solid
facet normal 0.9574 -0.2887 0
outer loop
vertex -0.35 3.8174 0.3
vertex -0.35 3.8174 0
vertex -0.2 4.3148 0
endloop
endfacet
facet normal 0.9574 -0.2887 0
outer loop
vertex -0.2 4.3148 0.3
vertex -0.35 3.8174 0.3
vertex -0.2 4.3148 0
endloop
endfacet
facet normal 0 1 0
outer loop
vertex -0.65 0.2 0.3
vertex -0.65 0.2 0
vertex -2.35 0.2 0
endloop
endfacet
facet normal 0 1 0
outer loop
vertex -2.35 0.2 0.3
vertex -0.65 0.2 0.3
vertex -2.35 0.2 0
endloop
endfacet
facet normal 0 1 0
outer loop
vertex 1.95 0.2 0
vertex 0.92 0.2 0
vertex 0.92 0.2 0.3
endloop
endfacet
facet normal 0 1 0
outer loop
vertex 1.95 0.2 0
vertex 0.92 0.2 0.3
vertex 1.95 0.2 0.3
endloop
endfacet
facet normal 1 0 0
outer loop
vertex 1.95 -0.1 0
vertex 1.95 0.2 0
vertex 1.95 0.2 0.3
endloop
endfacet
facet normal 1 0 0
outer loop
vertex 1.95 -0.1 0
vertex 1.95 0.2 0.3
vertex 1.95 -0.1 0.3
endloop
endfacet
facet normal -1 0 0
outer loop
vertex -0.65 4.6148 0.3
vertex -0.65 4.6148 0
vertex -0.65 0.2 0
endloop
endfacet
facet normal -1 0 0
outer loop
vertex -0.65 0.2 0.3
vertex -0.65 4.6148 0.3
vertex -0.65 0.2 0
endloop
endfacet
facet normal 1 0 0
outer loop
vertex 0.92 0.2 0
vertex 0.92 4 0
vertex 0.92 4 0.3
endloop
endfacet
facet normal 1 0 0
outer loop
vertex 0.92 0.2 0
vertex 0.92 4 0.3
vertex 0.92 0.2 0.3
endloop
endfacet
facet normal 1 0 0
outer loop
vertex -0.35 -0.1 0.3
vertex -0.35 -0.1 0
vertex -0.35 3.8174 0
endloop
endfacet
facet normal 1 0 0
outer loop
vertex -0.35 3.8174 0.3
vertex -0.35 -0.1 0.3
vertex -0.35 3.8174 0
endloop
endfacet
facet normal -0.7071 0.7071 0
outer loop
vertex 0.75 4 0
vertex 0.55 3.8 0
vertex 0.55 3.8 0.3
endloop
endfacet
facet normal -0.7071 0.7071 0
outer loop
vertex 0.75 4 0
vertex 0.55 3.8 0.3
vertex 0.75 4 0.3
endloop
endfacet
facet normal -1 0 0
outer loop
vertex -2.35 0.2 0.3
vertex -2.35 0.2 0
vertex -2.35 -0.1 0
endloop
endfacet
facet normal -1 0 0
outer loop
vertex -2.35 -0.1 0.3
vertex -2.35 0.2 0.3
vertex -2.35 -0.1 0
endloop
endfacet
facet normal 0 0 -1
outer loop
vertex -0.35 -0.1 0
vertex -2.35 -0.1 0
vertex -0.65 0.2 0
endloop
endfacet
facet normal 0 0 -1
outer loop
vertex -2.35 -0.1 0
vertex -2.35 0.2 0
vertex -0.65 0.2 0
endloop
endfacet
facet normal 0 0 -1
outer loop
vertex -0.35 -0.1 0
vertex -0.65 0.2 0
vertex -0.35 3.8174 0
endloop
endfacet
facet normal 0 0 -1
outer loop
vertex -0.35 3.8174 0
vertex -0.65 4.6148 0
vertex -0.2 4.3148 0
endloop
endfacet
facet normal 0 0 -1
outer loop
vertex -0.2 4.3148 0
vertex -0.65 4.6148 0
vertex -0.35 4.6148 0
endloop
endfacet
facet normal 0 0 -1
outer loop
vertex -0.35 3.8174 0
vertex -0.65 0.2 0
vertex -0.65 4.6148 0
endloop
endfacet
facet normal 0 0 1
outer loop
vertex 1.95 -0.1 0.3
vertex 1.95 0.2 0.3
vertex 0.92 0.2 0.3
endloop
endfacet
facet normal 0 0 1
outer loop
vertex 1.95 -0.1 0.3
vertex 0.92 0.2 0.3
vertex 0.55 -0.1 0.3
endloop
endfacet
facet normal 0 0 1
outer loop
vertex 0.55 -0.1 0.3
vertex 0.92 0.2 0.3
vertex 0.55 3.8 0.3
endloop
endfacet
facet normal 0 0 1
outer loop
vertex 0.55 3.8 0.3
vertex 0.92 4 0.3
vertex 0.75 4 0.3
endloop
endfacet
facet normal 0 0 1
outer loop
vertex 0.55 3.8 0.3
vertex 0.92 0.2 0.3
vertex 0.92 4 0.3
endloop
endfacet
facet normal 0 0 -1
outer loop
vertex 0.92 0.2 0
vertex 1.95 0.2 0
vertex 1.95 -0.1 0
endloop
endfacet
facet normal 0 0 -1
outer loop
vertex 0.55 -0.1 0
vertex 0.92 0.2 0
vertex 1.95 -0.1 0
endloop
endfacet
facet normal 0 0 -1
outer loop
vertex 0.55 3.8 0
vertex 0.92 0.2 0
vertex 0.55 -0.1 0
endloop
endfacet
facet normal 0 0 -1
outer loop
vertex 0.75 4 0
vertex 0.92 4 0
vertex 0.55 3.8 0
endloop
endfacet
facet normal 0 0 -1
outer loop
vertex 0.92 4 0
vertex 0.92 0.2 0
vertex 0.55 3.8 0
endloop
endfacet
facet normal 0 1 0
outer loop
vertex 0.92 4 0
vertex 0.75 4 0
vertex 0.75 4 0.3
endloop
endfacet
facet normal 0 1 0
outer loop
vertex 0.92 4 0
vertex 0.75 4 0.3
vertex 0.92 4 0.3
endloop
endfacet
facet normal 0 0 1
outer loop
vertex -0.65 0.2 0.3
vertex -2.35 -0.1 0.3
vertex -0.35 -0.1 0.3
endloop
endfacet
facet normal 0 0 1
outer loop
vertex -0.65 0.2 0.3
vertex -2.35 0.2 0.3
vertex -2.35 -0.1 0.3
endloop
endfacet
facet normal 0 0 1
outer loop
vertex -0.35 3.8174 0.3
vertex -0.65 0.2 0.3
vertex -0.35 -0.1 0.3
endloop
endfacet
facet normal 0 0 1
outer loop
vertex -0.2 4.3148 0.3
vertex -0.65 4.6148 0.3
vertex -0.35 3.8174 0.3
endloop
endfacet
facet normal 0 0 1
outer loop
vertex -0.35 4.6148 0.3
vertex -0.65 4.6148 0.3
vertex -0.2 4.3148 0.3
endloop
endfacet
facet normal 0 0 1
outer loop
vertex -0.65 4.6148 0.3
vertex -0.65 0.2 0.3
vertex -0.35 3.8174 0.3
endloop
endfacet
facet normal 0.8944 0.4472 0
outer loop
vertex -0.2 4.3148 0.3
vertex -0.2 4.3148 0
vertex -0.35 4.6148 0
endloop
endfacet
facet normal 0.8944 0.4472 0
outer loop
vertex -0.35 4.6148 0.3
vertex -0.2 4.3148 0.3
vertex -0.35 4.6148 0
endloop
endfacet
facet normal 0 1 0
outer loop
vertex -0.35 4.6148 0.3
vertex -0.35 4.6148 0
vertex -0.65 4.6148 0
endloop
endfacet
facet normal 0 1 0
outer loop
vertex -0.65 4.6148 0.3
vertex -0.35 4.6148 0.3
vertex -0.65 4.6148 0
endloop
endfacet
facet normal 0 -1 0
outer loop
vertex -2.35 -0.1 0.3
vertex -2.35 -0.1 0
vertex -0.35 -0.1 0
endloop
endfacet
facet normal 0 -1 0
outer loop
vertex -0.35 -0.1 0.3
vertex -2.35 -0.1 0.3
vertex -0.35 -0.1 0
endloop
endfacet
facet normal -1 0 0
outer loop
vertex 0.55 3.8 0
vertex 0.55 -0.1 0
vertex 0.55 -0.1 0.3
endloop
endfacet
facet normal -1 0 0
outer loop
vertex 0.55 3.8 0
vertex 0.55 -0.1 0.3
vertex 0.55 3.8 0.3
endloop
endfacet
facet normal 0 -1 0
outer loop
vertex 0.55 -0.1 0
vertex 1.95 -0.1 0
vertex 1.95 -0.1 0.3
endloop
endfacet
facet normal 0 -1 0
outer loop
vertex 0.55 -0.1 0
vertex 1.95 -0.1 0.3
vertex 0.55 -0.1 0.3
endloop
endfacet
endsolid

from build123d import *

# Parameters (mm, degrees)
RESSALTO_EXTRUS_O1_DEPTH   = 0.3
RESSALTO_EXTRUS_O1_2_DEPTH = 0.3


with BuildPart() as part:
    # Esboço1 → Ressalto-extrusão1 (new body)
    with BuildSketch(Plane.XY):
        Polygon((-2.35, -0.1), (-0.35, -0.1), (-0.35, 3.817407153), (-0.2, 4.314816679), (-0.35, 4.614816679), (-0.65, 4.614816679), (-0.65, 0.2), (-2.35, 0.2), align=None)
    extrude(amount=RESSALTO_EXTRUS_O1_DEPTH)


with BuildPart() as body_2:
    # Esboço1 → Ressalto-extrus_o1 2 (new body)
    with BuildSketch(Plane.XY):
        Polygon((1.95, -0.1), (0.55, -0.1), (0.55, 3.8), (0.75, 4), (0.92, 4), (0.92, 0.2), (1.95, 0.2), align=None)
    extrude(amount=RESSALTO_EXTRUS_O1_2_DEPTH)


solid = Compound([part.part, body_2.part])
